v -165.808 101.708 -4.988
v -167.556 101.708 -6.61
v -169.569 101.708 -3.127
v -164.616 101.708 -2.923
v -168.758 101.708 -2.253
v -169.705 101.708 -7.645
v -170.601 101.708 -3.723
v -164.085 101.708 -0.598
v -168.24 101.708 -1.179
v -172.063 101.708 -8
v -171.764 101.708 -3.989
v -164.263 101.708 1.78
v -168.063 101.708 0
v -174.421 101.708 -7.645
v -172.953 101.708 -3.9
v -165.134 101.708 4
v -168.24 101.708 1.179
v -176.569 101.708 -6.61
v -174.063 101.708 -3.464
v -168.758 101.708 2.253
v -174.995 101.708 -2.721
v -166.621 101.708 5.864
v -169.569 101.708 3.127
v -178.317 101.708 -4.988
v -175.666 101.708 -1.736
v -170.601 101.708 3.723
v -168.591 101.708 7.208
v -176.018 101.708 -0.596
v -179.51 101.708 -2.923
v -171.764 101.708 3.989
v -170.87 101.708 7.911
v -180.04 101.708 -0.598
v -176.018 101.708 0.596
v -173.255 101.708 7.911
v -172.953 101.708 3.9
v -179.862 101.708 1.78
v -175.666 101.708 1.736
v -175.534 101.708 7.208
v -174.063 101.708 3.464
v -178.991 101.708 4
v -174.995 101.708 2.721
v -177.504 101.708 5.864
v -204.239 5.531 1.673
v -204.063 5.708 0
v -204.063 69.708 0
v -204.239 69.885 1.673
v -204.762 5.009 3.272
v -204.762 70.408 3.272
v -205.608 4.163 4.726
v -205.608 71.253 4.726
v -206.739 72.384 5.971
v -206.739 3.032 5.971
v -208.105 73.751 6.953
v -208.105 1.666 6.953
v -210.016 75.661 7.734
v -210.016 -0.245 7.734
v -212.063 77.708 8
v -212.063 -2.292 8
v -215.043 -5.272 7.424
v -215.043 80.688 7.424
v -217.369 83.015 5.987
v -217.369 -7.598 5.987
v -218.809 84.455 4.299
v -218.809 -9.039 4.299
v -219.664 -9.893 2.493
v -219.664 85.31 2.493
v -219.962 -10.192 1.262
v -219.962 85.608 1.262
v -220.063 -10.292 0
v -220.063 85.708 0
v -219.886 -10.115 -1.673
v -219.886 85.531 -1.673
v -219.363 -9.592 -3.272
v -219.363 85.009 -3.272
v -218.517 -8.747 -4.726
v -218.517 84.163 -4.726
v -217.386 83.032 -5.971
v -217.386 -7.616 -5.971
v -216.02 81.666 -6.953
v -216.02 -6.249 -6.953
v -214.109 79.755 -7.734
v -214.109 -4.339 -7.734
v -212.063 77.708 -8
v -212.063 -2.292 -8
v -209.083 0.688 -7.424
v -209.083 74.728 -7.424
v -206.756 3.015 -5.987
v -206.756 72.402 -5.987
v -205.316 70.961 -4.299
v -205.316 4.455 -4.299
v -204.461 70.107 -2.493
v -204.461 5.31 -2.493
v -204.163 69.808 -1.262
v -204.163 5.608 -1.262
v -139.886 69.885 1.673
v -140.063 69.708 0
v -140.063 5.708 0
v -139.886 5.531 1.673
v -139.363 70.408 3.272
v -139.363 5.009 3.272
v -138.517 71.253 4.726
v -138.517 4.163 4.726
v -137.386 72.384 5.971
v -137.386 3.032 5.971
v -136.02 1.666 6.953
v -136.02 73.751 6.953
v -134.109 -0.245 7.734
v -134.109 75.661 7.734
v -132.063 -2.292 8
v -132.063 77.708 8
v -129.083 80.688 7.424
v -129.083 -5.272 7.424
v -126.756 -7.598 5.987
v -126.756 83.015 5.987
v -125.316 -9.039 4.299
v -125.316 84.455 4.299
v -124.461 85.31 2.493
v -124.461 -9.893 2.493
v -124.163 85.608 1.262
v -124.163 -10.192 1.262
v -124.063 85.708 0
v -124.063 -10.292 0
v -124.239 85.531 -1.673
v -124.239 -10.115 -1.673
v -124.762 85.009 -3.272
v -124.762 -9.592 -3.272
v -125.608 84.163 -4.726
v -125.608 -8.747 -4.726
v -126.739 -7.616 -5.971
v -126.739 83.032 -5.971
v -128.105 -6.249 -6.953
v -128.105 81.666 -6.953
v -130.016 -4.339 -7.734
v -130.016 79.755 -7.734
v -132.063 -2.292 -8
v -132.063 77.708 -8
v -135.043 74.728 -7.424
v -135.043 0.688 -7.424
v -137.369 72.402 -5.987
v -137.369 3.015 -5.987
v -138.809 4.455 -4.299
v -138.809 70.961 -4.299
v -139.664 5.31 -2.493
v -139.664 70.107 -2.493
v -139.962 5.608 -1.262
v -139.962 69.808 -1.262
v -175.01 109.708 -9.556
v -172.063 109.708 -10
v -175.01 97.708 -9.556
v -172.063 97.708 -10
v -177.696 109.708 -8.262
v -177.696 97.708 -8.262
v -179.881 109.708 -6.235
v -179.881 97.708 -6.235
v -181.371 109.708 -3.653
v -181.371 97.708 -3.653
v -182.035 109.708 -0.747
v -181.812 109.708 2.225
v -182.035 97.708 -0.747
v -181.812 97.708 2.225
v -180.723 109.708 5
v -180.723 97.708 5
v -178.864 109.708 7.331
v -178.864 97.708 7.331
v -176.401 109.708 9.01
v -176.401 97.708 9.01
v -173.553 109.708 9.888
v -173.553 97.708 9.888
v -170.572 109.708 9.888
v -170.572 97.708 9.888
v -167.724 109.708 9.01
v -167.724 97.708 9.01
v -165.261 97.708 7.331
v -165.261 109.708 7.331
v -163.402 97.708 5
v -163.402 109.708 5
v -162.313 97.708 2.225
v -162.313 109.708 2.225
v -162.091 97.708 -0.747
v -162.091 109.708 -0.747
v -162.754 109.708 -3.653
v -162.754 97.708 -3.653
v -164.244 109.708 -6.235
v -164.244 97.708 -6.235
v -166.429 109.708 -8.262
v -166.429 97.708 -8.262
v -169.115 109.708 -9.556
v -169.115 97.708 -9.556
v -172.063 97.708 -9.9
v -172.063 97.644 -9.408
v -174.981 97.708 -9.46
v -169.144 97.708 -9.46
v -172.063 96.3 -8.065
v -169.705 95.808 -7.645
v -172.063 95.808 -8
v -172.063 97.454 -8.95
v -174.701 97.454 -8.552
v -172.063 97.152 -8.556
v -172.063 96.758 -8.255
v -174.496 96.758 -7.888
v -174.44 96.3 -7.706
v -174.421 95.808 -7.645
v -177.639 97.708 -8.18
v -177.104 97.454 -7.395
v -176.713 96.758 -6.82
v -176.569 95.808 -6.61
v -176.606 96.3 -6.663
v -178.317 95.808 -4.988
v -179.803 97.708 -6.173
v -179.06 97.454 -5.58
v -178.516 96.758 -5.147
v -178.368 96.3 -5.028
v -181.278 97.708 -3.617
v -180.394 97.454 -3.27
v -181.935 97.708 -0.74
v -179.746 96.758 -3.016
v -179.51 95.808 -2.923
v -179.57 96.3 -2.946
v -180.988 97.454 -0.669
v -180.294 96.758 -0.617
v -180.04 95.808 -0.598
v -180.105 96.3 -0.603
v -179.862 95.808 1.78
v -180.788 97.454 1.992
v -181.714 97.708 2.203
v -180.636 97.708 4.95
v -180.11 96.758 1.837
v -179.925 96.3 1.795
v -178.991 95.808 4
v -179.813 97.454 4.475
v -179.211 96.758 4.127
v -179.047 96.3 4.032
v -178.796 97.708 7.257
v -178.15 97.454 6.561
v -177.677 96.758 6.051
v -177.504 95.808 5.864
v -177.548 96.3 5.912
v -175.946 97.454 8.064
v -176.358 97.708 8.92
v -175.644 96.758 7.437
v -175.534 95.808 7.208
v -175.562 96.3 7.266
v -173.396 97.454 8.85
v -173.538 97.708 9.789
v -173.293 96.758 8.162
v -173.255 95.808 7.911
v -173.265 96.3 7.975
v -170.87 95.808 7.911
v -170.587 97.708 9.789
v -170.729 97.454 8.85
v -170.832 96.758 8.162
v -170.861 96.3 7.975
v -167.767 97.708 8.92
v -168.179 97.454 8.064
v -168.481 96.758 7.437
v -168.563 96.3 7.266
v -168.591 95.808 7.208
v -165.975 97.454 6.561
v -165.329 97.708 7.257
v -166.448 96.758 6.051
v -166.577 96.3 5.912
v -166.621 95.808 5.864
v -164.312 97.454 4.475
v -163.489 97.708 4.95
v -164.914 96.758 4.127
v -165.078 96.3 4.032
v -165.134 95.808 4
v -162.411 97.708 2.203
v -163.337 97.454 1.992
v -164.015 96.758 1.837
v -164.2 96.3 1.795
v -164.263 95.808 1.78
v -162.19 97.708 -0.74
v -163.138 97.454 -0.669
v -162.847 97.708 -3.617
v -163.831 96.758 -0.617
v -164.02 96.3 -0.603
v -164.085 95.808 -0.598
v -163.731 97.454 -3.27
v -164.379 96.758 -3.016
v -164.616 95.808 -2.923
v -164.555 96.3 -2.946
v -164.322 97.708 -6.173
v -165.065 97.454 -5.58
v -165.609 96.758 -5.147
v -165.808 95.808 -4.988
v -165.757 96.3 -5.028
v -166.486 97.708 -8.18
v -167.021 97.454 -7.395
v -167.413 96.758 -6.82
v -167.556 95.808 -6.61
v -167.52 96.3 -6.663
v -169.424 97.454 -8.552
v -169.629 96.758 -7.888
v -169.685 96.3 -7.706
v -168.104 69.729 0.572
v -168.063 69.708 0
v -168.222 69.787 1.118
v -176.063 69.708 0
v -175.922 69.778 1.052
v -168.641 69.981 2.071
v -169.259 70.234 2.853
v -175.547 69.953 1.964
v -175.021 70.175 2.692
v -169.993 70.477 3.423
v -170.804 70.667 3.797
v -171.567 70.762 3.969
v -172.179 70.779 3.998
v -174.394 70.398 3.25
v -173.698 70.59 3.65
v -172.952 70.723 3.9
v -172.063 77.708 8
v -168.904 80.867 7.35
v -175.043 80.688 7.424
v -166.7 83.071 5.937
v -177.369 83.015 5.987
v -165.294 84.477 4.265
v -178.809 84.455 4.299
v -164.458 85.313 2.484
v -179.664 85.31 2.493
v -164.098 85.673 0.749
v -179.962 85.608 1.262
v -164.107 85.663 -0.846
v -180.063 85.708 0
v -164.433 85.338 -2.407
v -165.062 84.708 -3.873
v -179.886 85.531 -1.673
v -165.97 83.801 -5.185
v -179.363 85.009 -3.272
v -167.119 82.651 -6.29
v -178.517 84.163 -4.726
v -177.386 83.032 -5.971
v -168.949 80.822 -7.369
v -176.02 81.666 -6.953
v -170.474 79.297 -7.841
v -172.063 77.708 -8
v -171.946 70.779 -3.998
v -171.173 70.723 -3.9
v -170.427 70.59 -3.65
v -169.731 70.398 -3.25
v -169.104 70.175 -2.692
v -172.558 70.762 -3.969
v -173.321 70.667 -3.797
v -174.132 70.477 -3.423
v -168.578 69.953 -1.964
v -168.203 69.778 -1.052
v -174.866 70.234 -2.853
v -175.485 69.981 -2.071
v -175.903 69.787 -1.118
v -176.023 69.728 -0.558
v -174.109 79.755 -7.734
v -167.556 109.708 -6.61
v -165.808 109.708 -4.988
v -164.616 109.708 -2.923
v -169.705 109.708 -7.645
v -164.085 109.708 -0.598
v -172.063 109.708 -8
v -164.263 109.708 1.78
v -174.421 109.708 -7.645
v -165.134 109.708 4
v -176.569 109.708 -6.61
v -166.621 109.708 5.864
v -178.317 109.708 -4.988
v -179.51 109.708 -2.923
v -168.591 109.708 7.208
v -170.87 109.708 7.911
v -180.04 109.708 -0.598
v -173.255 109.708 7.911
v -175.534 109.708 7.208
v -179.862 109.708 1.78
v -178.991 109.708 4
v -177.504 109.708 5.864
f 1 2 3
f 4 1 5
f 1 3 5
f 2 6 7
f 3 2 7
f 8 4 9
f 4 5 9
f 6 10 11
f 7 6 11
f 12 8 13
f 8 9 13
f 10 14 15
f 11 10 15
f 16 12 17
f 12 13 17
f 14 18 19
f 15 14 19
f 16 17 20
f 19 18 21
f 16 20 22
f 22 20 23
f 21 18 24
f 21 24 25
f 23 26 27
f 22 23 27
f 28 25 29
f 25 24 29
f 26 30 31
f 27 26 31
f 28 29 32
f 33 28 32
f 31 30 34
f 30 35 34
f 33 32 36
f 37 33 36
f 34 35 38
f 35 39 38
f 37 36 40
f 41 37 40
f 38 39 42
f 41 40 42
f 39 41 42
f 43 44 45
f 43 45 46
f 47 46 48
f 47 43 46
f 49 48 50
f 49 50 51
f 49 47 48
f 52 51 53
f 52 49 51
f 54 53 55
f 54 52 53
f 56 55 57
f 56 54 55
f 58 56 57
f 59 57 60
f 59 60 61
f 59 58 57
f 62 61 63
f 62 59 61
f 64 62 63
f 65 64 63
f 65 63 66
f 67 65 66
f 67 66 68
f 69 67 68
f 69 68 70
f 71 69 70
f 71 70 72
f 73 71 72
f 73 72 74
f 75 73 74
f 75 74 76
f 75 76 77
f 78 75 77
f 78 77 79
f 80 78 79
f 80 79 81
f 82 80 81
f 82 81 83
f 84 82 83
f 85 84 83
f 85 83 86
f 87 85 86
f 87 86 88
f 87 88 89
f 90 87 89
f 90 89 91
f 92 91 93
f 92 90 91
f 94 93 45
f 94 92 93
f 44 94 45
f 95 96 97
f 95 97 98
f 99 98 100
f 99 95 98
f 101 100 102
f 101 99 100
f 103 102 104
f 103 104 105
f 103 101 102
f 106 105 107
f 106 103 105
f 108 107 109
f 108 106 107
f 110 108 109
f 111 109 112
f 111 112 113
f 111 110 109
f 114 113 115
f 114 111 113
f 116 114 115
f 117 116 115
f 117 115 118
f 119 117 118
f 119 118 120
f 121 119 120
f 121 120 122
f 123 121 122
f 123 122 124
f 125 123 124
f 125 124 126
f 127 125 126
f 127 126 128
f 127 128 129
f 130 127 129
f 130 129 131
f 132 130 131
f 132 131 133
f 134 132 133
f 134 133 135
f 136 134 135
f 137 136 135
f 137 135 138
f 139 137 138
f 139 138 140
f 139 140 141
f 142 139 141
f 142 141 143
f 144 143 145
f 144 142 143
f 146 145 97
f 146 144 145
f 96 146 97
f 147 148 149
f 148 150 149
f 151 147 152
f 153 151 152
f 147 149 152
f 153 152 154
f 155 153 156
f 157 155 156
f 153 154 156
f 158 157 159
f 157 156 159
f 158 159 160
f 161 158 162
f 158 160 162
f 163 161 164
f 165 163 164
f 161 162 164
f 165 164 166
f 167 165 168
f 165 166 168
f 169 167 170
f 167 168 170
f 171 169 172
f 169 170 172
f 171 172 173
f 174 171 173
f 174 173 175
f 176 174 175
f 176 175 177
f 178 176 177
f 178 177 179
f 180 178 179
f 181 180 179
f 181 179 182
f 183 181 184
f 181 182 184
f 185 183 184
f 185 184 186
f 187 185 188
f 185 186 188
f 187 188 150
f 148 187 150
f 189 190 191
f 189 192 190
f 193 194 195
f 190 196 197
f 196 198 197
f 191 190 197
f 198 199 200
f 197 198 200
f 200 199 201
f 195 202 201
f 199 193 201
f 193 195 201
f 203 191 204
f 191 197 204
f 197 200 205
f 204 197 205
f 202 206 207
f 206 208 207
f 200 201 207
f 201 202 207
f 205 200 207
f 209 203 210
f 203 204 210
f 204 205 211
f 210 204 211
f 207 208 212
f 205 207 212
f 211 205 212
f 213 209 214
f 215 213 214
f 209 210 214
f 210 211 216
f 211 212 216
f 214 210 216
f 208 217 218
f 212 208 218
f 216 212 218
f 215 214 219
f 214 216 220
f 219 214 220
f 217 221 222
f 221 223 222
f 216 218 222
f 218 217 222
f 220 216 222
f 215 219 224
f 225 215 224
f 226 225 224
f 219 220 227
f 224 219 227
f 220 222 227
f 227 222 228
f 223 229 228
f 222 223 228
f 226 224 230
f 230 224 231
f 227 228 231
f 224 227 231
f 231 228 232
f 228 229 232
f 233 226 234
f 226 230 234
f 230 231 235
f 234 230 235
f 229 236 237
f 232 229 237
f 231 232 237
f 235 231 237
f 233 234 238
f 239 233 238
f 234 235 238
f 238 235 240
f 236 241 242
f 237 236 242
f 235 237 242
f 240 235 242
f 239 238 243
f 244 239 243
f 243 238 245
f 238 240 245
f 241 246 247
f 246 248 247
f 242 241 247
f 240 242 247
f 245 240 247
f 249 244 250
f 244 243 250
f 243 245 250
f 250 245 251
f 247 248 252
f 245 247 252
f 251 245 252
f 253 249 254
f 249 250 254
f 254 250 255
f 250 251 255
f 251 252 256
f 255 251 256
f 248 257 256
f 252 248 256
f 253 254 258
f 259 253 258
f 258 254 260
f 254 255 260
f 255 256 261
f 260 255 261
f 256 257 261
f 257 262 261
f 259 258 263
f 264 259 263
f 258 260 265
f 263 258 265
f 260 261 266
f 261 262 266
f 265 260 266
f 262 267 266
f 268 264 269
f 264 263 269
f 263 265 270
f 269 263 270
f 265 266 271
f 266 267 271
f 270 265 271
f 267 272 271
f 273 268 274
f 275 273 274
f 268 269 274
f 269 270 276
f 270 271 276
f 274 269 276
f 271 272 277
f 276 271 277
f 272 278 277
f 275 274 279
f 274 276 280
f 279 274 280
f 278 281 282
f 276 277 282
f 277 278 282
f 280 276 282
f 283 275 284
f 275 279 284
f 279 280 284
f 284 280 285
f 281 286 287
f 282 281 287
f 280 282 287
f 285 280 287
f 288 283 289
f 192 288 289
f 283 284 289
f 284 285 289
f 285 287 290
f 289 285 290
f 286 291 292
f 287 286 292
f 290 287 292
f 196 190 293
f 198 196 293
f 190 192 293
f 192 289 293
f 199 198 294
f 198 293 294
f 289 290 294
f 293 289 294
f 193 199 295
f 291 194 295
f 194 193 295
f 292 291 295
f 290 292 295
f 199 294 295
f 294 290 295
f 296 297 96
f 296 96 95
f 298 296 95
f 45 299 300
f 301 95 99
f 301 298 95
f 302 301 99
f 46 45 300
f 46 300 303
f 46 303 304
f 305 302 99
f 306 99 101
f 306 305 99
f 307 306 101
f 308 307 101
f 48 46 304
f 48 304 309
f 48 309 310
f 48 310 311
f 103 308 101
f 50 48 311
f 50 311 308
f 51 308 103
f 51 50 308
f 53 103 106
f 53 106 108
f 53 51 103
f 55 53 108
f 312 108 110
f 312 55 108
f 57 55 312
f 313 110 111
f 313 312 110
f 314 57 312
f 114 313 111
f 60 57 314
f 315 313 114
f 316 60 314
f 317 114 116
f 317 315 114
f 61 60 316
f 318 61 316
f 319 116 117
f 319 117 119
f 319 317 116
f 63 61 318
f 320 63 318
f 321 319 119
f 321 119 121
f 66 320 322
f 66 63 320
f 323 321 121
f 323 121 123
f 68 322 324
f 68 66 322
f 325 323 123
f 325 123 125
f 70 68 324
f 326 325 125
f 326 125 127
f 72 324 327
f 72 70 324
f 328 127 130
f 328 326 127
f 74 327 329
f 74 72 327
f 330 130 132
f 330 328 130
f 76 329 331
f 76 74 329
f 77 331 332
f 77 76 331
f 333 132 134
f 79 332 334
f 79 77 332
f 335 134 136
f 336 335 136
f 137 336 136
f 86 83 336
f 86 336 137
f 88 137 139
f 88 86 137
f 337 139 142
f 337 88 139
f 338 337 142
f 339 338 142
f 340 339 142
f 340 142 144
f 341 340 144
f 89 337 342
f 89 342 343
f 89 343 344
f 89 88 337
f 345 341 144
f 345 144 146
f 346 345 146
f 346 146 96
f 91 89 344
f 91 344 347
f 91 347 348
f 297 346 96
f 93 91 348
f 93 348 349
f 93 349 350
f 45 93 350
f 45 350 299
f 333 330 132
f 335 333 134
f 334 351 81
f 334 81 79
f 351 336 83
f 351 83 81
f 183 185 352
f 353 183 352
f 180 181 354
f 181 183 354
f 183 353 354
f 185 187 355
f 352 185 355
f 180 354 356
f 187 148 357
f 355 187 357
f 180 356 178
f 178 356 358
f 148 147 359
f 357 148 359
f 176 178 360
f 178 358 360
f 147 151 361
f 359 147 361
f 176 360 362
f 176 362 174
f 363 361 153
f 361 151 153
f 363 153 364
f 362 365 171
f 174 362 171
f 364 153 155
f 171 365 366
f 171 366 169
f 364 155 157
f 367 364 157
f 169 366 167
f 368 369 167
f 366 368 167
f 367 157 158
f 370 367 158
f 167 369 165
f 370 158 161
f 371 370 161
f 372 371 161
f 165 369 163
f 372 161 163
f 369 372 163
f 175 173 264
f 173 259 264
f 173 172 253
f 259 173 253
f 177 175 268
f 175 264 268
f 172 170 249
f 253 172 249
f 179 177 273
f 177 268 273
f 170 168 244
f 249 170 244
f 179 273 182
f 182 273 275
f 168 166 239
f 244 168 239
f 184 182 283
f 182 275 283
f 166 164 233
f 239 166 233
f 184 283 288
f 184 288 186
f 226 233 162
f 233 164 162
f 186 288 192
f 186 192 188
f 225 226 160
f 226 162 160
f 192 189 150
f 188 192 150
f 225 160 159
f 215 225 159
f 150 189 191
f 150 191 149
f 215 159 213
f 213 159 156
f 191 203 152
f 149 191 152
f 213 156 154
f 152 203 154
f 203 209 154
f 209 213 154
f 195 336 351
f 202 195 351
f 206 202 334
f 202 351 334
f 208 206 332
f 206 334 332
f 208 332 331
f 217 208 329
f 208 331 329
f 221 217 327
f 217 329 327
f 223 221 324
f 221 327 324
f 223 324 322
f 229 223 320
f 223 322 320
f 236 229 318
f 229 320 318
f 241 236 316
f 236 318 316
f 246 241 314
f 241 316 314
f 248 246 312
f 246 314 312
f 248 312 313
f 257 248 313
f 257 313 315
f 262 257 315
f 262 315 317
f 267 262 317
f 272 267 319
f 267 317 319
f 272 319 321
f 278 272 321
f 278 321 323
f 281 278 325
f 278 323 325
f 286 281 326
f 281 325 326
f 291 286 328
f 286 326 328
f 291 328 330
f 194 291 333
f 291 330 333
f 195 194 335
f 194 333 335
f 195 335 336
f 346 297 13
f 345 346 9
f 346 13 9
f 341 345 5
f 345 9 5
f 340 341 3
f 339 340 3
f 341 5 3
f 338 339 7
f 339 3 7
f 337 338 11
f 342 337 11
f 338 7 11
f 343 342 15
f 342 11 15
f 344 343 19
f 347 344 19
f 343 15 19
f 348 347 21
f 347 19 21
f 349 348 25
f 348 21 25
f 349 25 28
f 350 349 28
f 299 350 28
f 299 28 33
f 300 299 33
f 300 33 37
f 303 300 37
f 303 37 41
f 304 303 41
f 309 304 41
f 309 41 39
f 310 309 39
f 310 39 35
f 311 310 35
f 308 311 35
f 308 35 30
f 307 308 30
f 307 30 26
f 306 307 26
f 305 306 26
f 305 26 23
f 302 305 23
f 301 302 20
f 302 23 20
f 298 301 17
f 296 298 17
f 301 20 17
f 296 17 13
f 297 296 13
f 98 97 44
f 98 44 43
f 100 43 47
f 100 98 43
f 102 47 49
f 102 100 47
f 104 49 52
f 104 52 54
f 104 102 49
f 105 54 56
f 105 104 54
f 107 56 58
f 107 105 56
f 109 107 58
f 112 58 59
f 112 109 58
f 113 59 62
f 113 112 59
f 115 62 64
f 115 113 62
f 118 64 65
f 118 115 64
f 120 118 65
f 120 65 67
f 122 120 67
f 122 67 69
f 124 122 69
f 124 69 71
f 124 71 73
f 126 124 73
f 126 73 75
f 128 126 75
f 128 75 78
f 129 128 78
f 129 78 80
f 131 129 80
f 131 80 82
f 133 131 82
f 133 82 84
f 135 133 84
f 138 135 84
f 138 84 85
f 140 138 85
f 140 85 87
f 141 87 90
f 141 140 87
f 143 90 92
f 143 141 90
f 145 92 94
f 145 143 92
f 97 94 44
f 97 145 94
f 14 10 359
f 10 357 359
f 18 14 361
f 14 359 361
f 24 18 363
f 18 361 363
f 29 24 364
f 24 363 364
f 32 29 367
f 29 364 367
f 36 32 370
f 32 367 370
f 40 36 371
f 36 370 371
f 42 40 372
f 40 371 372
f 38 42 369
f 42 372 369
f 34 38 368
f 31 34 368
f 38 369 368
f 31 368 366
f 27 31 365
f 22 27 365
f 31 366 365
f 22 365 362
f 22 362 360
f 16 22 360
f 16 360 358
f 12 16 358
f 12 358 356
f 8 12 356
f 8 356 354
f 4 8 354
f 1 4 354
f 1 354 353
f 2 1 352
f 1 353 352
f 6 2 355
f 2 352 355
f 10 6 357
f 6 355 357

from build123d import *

# Parameters (mm, degrees)
SWEEP5_PROFILE_R         = 8
TAGLIO_ESTRUSIONE1_REACH = 114
SCHIZZO15_R              = 4


with BuildPart() as part:
    # Sweep5: sweep along a path in Schizzo1
    with BuildLine(Plane.XY) as sweep5_path:
        Line((-132.062548693, 77.708245302), (-212.062548693, 77.708245302))
        Line((-212.062548693, 77.708245302), (-212.062548693, -2.291754698))
        Line((-212.062548693, -2.291754698), (-132.062548693, -2.291754698))
        Line((-132.062548693, -2.291754698), (-132.062548693, 77.708245302))
    # Sweep5 profile (on start of the path) → Sweep5 (sweep)
    with BuildSketch(Plane(origin=(-132.062548693, 77.708245302, 0), x_dir=(0, -1, 0), z_dir=(-1, 0, 0))):
        Circle(SWEEP5_PROFILE_R)
    sweep(path=sweep5_path.line, transition=Transition.RIGHT)

    # Schizzo14 → Rivoluzione1 (revolve)
    with BuildSketch(Plane(origin=(-172.062548693, 0, 0), x_dir=(0, -1, 0), z_dir=(1, 0, 0))):
        with BuildLine():
            Line((-77.708245302, 0), (-101.708245302, 0))
            Line((-101.708245302, 0), (-101.708245302, 8))
            Line((-101.708245302, 8), (-109.708245302, 8))
            Line((-109.708245302, 8), (-109.708245302, 10))
            Line((-109.708245302, 10), (-97.708245302, 10))
            Line((-97.708245302, 10), (-97.708245302, 9.9))
            ThreePointArc((-97.708245302, 9.9), (-97.151748186, 8.556497116), (-95.808245302, 8))
            Line((-95.808245302, 8), (-77.708245302, 8))
            Line((-77.708245302, 8), (-77.708245302, 0))
        make_face()
    revolve(axis=Axis((-172.062548693, 29.552378968, 0), (0, 1, 0)))

    # Schizzo15 → Taglio-Estrusione1 (cut, up to next)
    with BuildSketch(Plane(origin=(0, 101.708245302, 0), x_dir=(1, 0, 0), z_dir=(0, 1, 0)), mode=Mode.PRIVATE) as taglio_estrusione1_sk1:
        with Locations((-172.062548693, 0)):
            Circle(SCHIZZO15_R)
    taglio_estrusione1_tool1 = extrude(taglio_estrusione1_sk1.sketch, amount=-TAGLIO_ESTRUSIONE1_REACH, mode=Mode.PRIVATE) & part.part
    add(taglio_estrusione1_tool1.solids().sort_by_distance((-172.062549, 101.708245, 0))[0], mode=Mode.SUBTRACT)


solid = part.part
